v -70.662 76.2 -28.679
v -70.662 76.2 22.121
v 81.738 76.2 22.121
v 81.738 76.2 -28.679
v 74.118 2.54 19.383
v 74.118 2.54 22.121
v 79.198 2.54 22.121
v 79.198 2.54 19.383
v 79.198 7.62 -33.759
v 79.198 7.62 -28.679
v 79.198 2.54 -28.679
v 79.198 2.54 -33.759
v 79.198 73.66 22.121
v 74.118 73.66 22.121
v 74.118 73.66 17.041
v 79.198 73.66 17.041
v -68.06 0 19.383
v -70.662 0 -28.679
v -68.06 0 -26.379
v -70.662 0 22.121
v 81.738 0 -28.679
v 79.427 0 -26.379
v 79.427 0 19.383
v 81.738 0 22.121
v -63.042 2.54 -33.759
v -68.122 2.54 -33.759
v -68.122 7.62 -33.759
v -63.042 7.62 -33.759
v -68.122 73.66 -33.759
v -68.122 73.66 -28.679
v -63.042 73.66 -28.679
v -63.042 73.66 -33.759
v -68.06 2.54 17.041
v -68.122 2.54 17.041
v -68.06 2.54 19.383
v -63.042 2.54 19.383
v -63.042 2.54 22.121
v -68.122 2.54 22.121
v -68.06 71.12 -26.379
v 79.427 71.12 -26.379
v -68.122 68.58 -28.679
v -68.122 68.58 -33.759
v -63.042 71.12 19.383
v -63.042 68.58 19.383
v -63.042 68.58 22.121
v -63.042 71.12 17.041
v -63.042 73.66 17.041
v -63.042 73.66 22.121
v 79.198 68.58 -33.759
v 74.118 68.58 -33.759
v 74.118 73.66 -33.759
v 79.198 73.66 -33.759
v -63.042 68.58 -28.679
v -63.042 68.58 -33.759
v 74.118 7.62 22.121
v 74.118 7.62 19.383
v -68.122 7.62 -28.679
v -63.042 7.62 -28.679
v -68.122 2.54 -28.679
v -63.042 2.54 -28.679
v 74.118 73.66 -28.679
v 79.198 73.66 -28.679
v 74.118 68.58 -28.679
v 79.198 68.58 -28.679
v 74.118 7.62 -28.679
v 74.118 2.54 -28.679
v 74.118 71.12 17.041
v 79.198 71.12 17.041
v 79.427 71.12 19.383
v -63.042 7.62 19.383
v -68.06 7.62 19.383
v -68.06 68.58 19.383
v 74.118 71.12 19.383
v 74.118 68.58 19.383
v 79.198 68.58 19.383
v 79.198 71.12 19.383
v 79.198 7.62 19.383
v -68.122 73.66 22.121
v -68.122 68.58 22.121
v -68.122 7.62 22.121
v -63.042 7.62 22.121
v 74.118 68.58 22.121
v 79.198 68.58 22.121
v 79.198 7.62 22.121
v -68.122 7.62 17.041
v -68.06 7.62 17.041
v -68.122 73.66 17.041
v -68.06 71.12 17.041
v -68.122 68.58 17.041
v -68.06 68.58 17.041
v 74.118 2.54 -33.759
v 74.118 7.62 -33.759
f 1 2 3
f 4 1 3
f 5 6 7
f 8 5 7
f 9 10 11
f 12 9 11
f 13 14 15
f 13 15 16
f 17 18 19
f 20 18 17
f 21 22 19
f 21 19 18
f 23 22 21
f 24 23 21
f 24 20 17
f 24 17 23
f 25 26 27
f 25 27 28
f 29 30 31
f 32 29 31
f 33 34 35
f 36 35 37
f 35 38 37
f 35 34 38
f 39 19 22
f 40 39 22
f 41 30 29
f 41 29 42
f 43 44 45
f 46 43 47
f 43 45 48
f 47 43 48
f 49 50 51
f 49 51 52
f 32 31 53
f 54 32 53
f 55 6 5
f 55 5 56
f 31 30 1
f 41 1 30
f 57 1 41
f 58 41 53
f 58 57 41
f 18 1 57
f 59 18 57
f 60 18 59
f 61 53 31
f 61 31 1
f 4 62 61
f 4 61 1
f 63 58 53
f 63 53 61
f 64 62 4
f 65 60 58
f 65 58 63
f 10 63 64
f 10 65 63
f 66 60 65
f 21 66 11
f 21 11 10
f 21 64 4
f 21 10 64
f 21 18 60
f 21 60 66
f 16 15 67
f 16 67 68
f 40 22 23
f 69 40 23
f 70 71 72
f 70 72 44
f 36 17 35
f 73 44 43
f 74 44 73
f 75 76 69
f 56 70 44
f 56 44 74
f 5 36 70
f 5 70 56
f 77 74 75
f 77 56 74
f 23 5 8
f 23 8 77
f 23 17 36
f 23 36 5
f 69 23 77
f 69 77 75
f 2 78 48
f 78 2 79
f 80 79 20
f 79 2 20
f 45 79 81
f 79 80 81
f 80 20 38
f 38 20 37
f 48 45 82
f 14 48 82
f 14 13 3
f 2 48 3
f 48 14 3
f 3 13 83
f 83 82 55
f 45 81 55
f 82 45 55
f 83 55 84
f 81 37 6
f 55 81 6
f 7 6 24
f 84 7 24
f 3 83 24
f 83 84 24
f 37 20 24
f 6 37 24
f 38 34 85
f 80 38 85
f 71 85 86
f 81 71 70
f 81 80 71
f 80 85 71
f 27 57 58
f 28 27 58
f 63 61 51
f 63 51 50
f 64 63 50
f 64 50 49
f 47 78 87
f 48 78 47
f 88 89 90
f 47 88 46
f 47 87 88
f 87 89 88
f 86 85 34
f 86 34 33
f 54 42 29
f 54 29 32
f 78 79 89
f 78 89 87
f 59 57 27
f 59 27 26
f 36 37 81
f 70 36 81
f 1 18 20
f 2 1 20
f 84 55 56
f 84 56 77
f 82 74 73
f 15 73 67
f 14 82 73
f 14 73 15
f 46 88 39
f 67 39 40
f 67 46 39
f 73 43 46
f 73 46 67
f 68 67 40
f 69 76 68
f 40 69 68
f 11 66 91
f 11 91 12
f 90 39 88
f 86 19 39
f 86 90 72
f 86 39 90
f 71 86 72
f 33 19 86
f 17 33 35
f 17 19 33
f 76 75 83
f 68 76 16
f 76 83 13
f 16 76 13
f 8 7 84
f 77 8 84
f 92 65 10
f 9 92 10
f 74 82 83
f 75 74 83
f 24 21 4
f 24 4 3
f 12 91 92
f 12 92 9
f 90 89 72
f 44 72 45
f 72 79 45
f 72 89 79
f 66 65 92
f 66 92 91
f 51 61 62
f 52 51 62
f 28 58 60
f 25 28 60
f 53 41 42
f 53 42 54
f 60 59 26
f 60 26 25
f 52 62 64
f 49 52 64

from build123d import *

# Parameters (mm, degrees)
F0_W     = 152.4
F0_H     = 50.8
F1_DEPTH = 76.2
F2_W     = 147.48656
F2_H     = 45.76164
F3_DEPTH = 71.12
F4_W     = 5.08
F4_H     = 5.080001
F4_H_2   = 5.08
F5_DEPTH = 5.08
F6_W     = 5.08
F6_H     = 5.08
F7_DEPTH = 5.08


with BuildPart() as f1:
    # F0 (on Front) → F1 (new body)
    with BuildSketch(Plane.XZ):
        with Locations((5.538031, -3.279099)):
            Rectangle(F0_W, F0_H)
    extrude(amount=-F1_DEPTH)

    # F2 (on Front) → F3 (cut)
    with BuildSketch(Plane.XZ):
        with Locations((5.683769, -3.497704)):
            Rectangle(F2_W, F2_H)
    extrude(amount=-F3_DEPTH, mode=Mode.SUBTRACT)

    # F4 (on face) → F5 (join)
    with BuildSketch(Plane(origin=(0, 0, -28.679099), x_dir=(1, 0, 0), z_dir=(0, 0, -1))):
        with Locations((-65.581969, -5.08)):
            Rectangle(F4_W, F4_H)
        with Locations((76.658031, -5.08)):
            Rectangle(F4_W, F4_H)
        with Locations((76.658031, -71.12)):
            Rectangle(F4_W, F4_H)
        with Locations((-65.581969, -71.12)):
            Rectangle(F4_W, F4_H_2)
    extrude(amount=F5_DEPTH)

    # F6 (on face) → F7 (cut)
    with BuildSketch(Plane.XY.offset(22.120901)):
        with Locations((-65.581969, 71.12)):
            Rectangle(F6_W, F6_H)
        with Locations((-65.581969, 5.08)):
            Rectangle(F6_W, F6_H)
        with Locations((76.658031, 71.12)):
            Rectangle(F6_W, F6_H)
        with Locations((76.658031, 5.08)):
            Rectangle(F6_W, F6_H)
    extrude(amount=-F7_DEPTH, mode=Mode.SUBTRACT)


solid = f1.part
